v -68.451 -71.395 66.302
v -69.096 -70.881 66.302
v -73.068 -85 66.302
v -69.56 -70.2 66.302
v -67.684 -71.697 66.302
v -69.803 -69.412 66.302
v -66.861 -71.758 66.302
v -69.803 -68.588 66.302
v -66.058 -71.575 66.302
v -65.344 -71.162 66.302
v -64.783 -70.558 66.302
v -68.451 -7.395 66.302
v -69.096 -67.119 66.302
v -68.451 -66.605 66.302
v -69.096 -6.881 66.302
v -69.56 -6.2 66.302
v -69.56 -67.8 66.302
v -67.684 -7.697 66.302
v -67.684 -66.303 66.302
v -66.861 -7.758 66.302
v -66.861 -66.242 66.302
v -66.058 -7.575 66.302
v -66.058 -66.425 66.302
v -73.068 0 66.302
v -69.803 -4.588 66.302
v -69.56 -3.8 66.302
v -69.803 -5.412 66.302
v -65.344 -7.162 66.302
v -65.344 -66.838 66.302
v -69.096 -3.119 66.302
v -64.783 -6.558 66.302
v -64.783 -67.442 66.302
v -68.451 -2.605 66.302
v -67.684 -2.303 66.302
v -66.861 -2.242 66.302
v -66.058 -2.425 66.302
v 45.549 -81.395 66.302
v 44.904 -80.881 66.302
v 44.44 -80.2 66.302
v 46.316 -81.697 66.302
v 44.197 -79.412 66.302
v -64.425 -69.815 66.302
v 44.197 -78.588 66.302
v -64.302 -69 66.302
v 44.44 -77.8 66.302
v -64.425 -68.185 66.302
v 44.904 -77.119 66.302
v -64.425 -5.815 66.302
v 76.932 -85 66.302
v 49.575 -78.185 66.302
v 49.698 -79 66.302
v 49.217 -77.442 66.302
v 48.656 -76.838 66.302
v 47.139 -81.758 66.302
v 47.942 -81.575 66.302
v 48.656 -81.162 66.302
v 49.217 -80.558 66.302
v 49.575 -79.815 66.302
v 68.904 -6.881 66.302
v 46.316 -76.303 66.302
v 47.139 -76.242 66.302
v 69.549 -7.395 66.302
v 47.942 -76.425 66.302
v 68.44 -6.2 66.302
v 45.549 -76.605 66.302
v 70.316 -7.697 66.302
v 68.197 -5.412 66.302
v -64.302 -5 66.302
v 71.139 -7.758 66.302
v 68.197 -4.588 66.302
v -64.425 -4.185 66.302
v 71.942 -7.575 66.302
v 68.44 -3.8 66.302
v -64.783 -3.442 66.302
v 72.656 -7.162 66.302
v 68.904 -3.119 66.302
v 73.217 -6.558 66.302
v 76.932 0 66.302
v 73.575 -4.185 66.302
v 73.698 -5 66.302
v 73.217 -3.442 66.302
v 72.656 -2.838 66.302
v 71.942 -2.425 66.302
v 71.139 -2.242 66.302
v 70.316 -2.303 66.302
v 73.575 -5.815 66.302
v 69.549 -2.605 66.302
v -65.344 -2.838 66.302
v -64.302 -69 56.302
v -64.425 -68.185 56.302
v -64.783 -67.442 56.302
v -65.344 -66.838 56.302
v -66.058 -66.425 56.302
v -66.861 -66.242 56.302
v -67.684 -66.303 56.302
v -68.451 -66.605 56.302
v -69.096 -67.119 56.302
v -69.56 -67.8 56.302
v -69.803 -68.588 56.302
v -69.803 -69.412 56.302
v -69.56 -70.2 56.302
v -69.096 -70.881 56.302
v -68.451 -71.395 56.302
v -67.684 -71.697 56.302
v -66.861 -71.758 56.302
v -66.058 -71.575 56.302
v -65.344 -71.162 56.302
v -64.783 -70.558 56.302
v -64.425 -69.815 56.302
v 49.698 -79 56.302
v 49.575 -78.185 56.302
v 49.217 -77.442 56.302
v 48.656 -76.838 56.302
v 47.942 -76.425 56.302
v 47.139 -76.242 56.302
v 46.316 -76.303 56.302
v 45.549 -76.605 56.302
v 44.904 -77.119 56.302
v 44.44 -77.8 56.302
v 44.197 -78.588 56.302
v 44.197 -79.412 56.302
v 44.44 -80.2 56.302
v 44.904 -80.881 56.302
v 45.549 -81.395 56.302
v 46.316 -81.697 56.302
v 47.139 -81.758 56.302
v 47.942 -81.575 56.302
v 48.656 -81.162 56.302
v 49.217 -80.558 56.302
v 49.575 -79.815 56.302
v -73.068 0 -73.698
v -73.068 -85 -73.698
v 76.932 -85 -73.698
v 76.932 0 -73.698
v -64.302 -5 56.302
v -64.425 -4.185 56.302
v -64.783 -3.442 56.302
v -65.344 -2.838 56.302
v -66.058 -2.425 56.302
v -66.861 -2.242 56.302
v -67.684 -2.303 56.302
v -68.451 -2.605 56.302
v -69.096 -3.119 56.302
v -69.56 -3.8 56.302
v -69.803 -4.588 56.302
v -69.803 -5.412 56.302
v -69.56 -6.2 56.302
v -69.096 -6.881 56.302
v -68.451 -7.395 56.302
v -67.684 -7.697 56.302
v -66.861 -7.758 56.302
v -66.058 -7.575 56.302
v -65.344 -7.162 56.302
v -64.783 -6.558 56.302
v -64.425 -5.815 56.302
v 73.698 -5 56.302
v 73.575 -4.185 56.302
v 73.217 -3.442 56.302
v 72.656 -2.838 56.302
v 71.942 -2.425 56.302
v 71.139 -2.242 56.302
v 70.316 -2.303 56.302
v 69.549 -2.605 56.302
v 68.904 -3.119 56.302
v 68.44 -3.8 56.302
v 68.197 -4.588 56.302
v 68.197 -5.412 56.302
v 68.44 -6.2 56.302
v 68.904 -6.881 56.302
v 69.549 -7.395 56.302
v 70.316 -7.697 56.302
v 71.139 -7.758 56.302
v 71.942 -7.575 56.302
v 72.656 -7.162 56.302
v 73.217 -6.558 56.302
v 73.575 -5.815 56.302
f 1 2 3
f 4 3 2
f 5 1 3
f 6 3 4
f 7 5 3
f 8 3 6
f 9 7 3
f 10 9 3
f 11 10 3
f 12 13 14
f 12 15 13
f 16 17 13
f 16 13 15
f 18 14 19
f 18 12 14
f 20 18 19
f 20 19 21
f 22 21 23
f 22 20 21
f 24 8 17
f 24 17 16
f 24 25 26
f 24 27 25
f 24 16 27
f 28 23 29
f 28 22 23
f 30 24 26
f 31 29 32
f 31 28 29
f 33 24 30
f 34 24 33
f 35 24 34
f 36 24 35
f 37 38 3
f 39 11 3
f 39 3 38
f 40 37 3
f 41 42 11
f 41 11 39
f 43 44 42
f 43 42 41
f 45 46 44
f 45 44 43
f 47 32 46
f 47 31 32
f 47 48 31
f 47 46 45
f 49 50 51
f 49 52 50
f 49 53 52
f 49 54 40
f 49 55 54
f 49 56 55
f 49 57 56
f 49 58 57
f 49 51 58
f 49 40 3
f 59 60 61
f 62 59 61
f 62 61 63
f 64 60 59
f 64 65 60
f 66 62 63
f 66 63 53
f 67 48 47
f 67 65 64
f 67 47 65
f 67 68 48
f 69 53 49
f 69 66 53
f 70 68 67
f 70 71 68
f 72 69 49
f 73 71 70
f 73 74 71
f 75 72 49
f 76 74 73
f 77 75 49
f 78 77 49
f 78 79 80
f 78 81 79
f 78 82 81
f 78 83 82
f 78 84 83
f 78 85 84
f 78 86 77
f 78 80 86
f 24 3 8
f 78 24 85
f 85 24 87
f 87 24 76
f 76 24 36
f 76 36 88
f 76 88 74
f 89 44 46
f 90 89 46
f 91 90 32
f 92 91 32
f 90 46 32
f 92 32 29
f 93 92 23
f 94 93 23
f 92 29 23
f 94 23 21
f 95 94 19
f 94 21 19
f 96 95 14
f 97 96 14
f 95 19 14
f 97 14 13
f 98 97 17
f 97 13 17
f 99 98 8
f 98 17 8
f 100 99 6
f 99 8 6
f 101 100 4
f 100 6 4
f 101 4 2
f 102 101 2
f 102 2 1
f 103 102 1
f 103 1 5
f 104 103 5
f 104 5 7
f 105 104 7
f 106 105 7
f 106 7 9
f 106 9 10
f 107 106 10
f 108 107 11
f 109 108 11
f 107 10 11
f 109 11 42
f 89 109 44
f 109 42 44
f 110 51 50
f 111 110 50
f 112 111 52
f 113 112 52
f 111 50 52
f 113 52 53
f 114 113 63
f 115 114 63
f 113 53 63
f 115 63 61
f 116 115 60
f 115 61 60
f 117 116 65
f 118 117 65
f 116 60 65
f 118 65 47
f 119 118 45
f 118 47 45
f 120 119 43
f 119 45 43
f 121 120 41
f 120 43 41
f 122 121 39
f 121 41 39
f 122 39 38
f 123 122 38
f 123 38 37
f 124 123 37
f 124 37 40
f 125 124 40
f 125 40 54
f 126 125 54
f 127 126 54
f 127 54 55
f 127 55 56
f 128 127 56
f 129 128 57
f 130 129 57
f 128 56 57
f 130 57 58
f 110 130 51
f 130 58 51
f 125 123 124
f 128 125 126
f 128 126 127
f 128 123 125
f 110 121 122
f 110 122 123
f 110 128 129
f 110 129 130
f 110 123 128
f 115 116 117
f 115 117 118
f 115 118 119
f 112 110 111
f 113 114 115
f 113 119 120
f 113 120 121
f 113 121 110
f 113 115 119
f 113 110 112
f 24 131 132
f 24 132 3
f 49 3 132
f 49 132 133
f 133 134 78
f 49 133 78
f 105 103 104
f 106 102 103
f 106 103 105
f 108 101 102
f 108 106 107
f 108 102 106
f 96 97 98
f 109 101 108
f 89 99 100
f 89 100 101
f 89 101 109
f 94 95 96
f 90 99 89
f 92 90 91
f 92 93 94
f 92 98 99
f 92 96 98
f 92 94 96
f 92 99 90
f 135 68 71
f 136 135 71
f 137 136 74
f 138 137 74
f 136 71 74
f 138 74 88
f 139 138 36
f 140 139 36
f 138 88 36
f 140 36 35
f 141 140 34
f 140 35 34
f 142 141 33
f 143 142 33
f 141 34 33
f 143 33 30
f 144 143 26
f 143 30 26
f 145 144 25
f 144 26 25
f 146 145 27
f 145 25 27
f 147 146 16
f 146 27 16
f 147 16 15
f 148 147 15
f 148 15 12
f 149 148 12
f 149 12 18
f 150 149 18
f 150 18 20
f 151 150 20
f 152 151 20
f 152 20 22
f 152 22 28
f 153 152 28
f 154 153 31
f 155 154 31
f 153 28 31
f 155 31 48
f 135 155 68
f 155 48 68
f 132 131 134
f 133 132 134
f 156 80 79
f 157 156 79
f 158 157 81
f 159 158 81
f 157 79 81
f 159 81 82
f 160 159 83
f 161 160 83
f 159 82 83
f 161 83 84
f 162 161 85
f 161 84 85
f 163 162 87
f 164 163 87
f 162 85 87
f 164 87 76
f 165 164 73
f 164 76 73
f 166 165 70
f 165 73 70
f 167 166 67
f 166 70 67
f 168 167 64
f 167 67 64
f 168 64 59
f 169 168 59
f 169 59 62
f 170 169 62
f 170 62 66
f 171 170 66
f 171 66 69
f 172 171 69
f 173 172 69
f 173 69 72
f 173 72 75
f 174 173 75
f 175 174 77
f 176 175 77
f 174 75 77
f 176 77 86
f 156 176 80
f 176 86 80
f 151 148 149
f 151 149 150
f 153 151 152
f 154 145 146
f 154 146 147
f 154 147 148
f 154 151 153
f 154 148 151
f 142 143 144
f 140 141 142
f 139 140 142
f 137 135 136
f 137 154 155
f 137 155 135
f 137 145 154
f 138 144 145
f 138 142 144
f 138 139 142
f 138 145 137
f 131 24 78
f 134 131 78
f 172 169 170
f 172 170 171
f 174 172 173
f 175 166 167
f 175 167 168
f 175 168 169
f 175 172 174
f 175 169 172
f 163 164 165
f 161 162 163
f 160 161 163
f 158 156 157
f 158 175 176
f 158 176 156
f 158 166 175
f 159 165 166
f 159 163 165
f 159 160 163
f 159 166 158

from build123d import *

# Parameters (mm, degrees)
F0_W     = 150
F0_H     = 140
F1_DEPTH = 85
F2_R     = 2.765875
F3_DEPTH = 10


with BuildPart() as f1:
    # F0 (on Front) → F1 (new body)
    with BuildSketch(Plane.XZ):
        with Locations((1.931816, -3.698107)):
            Rectangle(F0_W, F0_H)
    extrude(amount=F1_DEPTH)

    # F2 (on face) → F3 (cut)
    with BuildSketch(Plane.XY.offset(66.301893)):
        with Locations((-67.068184, -5)):
            Circle(F2_R)
        with Locations((-67.068184, -69)):
            Circle(F2_R)
        with Locations((70.931816, -5)):
            Circle(F2_R)
        with Locations((46.931816, -79)):
            Circle(F2_R)
    extrude(amount=-F3_DEPTH, mode=Mode.SUBTRACT)


solid = f1.part
